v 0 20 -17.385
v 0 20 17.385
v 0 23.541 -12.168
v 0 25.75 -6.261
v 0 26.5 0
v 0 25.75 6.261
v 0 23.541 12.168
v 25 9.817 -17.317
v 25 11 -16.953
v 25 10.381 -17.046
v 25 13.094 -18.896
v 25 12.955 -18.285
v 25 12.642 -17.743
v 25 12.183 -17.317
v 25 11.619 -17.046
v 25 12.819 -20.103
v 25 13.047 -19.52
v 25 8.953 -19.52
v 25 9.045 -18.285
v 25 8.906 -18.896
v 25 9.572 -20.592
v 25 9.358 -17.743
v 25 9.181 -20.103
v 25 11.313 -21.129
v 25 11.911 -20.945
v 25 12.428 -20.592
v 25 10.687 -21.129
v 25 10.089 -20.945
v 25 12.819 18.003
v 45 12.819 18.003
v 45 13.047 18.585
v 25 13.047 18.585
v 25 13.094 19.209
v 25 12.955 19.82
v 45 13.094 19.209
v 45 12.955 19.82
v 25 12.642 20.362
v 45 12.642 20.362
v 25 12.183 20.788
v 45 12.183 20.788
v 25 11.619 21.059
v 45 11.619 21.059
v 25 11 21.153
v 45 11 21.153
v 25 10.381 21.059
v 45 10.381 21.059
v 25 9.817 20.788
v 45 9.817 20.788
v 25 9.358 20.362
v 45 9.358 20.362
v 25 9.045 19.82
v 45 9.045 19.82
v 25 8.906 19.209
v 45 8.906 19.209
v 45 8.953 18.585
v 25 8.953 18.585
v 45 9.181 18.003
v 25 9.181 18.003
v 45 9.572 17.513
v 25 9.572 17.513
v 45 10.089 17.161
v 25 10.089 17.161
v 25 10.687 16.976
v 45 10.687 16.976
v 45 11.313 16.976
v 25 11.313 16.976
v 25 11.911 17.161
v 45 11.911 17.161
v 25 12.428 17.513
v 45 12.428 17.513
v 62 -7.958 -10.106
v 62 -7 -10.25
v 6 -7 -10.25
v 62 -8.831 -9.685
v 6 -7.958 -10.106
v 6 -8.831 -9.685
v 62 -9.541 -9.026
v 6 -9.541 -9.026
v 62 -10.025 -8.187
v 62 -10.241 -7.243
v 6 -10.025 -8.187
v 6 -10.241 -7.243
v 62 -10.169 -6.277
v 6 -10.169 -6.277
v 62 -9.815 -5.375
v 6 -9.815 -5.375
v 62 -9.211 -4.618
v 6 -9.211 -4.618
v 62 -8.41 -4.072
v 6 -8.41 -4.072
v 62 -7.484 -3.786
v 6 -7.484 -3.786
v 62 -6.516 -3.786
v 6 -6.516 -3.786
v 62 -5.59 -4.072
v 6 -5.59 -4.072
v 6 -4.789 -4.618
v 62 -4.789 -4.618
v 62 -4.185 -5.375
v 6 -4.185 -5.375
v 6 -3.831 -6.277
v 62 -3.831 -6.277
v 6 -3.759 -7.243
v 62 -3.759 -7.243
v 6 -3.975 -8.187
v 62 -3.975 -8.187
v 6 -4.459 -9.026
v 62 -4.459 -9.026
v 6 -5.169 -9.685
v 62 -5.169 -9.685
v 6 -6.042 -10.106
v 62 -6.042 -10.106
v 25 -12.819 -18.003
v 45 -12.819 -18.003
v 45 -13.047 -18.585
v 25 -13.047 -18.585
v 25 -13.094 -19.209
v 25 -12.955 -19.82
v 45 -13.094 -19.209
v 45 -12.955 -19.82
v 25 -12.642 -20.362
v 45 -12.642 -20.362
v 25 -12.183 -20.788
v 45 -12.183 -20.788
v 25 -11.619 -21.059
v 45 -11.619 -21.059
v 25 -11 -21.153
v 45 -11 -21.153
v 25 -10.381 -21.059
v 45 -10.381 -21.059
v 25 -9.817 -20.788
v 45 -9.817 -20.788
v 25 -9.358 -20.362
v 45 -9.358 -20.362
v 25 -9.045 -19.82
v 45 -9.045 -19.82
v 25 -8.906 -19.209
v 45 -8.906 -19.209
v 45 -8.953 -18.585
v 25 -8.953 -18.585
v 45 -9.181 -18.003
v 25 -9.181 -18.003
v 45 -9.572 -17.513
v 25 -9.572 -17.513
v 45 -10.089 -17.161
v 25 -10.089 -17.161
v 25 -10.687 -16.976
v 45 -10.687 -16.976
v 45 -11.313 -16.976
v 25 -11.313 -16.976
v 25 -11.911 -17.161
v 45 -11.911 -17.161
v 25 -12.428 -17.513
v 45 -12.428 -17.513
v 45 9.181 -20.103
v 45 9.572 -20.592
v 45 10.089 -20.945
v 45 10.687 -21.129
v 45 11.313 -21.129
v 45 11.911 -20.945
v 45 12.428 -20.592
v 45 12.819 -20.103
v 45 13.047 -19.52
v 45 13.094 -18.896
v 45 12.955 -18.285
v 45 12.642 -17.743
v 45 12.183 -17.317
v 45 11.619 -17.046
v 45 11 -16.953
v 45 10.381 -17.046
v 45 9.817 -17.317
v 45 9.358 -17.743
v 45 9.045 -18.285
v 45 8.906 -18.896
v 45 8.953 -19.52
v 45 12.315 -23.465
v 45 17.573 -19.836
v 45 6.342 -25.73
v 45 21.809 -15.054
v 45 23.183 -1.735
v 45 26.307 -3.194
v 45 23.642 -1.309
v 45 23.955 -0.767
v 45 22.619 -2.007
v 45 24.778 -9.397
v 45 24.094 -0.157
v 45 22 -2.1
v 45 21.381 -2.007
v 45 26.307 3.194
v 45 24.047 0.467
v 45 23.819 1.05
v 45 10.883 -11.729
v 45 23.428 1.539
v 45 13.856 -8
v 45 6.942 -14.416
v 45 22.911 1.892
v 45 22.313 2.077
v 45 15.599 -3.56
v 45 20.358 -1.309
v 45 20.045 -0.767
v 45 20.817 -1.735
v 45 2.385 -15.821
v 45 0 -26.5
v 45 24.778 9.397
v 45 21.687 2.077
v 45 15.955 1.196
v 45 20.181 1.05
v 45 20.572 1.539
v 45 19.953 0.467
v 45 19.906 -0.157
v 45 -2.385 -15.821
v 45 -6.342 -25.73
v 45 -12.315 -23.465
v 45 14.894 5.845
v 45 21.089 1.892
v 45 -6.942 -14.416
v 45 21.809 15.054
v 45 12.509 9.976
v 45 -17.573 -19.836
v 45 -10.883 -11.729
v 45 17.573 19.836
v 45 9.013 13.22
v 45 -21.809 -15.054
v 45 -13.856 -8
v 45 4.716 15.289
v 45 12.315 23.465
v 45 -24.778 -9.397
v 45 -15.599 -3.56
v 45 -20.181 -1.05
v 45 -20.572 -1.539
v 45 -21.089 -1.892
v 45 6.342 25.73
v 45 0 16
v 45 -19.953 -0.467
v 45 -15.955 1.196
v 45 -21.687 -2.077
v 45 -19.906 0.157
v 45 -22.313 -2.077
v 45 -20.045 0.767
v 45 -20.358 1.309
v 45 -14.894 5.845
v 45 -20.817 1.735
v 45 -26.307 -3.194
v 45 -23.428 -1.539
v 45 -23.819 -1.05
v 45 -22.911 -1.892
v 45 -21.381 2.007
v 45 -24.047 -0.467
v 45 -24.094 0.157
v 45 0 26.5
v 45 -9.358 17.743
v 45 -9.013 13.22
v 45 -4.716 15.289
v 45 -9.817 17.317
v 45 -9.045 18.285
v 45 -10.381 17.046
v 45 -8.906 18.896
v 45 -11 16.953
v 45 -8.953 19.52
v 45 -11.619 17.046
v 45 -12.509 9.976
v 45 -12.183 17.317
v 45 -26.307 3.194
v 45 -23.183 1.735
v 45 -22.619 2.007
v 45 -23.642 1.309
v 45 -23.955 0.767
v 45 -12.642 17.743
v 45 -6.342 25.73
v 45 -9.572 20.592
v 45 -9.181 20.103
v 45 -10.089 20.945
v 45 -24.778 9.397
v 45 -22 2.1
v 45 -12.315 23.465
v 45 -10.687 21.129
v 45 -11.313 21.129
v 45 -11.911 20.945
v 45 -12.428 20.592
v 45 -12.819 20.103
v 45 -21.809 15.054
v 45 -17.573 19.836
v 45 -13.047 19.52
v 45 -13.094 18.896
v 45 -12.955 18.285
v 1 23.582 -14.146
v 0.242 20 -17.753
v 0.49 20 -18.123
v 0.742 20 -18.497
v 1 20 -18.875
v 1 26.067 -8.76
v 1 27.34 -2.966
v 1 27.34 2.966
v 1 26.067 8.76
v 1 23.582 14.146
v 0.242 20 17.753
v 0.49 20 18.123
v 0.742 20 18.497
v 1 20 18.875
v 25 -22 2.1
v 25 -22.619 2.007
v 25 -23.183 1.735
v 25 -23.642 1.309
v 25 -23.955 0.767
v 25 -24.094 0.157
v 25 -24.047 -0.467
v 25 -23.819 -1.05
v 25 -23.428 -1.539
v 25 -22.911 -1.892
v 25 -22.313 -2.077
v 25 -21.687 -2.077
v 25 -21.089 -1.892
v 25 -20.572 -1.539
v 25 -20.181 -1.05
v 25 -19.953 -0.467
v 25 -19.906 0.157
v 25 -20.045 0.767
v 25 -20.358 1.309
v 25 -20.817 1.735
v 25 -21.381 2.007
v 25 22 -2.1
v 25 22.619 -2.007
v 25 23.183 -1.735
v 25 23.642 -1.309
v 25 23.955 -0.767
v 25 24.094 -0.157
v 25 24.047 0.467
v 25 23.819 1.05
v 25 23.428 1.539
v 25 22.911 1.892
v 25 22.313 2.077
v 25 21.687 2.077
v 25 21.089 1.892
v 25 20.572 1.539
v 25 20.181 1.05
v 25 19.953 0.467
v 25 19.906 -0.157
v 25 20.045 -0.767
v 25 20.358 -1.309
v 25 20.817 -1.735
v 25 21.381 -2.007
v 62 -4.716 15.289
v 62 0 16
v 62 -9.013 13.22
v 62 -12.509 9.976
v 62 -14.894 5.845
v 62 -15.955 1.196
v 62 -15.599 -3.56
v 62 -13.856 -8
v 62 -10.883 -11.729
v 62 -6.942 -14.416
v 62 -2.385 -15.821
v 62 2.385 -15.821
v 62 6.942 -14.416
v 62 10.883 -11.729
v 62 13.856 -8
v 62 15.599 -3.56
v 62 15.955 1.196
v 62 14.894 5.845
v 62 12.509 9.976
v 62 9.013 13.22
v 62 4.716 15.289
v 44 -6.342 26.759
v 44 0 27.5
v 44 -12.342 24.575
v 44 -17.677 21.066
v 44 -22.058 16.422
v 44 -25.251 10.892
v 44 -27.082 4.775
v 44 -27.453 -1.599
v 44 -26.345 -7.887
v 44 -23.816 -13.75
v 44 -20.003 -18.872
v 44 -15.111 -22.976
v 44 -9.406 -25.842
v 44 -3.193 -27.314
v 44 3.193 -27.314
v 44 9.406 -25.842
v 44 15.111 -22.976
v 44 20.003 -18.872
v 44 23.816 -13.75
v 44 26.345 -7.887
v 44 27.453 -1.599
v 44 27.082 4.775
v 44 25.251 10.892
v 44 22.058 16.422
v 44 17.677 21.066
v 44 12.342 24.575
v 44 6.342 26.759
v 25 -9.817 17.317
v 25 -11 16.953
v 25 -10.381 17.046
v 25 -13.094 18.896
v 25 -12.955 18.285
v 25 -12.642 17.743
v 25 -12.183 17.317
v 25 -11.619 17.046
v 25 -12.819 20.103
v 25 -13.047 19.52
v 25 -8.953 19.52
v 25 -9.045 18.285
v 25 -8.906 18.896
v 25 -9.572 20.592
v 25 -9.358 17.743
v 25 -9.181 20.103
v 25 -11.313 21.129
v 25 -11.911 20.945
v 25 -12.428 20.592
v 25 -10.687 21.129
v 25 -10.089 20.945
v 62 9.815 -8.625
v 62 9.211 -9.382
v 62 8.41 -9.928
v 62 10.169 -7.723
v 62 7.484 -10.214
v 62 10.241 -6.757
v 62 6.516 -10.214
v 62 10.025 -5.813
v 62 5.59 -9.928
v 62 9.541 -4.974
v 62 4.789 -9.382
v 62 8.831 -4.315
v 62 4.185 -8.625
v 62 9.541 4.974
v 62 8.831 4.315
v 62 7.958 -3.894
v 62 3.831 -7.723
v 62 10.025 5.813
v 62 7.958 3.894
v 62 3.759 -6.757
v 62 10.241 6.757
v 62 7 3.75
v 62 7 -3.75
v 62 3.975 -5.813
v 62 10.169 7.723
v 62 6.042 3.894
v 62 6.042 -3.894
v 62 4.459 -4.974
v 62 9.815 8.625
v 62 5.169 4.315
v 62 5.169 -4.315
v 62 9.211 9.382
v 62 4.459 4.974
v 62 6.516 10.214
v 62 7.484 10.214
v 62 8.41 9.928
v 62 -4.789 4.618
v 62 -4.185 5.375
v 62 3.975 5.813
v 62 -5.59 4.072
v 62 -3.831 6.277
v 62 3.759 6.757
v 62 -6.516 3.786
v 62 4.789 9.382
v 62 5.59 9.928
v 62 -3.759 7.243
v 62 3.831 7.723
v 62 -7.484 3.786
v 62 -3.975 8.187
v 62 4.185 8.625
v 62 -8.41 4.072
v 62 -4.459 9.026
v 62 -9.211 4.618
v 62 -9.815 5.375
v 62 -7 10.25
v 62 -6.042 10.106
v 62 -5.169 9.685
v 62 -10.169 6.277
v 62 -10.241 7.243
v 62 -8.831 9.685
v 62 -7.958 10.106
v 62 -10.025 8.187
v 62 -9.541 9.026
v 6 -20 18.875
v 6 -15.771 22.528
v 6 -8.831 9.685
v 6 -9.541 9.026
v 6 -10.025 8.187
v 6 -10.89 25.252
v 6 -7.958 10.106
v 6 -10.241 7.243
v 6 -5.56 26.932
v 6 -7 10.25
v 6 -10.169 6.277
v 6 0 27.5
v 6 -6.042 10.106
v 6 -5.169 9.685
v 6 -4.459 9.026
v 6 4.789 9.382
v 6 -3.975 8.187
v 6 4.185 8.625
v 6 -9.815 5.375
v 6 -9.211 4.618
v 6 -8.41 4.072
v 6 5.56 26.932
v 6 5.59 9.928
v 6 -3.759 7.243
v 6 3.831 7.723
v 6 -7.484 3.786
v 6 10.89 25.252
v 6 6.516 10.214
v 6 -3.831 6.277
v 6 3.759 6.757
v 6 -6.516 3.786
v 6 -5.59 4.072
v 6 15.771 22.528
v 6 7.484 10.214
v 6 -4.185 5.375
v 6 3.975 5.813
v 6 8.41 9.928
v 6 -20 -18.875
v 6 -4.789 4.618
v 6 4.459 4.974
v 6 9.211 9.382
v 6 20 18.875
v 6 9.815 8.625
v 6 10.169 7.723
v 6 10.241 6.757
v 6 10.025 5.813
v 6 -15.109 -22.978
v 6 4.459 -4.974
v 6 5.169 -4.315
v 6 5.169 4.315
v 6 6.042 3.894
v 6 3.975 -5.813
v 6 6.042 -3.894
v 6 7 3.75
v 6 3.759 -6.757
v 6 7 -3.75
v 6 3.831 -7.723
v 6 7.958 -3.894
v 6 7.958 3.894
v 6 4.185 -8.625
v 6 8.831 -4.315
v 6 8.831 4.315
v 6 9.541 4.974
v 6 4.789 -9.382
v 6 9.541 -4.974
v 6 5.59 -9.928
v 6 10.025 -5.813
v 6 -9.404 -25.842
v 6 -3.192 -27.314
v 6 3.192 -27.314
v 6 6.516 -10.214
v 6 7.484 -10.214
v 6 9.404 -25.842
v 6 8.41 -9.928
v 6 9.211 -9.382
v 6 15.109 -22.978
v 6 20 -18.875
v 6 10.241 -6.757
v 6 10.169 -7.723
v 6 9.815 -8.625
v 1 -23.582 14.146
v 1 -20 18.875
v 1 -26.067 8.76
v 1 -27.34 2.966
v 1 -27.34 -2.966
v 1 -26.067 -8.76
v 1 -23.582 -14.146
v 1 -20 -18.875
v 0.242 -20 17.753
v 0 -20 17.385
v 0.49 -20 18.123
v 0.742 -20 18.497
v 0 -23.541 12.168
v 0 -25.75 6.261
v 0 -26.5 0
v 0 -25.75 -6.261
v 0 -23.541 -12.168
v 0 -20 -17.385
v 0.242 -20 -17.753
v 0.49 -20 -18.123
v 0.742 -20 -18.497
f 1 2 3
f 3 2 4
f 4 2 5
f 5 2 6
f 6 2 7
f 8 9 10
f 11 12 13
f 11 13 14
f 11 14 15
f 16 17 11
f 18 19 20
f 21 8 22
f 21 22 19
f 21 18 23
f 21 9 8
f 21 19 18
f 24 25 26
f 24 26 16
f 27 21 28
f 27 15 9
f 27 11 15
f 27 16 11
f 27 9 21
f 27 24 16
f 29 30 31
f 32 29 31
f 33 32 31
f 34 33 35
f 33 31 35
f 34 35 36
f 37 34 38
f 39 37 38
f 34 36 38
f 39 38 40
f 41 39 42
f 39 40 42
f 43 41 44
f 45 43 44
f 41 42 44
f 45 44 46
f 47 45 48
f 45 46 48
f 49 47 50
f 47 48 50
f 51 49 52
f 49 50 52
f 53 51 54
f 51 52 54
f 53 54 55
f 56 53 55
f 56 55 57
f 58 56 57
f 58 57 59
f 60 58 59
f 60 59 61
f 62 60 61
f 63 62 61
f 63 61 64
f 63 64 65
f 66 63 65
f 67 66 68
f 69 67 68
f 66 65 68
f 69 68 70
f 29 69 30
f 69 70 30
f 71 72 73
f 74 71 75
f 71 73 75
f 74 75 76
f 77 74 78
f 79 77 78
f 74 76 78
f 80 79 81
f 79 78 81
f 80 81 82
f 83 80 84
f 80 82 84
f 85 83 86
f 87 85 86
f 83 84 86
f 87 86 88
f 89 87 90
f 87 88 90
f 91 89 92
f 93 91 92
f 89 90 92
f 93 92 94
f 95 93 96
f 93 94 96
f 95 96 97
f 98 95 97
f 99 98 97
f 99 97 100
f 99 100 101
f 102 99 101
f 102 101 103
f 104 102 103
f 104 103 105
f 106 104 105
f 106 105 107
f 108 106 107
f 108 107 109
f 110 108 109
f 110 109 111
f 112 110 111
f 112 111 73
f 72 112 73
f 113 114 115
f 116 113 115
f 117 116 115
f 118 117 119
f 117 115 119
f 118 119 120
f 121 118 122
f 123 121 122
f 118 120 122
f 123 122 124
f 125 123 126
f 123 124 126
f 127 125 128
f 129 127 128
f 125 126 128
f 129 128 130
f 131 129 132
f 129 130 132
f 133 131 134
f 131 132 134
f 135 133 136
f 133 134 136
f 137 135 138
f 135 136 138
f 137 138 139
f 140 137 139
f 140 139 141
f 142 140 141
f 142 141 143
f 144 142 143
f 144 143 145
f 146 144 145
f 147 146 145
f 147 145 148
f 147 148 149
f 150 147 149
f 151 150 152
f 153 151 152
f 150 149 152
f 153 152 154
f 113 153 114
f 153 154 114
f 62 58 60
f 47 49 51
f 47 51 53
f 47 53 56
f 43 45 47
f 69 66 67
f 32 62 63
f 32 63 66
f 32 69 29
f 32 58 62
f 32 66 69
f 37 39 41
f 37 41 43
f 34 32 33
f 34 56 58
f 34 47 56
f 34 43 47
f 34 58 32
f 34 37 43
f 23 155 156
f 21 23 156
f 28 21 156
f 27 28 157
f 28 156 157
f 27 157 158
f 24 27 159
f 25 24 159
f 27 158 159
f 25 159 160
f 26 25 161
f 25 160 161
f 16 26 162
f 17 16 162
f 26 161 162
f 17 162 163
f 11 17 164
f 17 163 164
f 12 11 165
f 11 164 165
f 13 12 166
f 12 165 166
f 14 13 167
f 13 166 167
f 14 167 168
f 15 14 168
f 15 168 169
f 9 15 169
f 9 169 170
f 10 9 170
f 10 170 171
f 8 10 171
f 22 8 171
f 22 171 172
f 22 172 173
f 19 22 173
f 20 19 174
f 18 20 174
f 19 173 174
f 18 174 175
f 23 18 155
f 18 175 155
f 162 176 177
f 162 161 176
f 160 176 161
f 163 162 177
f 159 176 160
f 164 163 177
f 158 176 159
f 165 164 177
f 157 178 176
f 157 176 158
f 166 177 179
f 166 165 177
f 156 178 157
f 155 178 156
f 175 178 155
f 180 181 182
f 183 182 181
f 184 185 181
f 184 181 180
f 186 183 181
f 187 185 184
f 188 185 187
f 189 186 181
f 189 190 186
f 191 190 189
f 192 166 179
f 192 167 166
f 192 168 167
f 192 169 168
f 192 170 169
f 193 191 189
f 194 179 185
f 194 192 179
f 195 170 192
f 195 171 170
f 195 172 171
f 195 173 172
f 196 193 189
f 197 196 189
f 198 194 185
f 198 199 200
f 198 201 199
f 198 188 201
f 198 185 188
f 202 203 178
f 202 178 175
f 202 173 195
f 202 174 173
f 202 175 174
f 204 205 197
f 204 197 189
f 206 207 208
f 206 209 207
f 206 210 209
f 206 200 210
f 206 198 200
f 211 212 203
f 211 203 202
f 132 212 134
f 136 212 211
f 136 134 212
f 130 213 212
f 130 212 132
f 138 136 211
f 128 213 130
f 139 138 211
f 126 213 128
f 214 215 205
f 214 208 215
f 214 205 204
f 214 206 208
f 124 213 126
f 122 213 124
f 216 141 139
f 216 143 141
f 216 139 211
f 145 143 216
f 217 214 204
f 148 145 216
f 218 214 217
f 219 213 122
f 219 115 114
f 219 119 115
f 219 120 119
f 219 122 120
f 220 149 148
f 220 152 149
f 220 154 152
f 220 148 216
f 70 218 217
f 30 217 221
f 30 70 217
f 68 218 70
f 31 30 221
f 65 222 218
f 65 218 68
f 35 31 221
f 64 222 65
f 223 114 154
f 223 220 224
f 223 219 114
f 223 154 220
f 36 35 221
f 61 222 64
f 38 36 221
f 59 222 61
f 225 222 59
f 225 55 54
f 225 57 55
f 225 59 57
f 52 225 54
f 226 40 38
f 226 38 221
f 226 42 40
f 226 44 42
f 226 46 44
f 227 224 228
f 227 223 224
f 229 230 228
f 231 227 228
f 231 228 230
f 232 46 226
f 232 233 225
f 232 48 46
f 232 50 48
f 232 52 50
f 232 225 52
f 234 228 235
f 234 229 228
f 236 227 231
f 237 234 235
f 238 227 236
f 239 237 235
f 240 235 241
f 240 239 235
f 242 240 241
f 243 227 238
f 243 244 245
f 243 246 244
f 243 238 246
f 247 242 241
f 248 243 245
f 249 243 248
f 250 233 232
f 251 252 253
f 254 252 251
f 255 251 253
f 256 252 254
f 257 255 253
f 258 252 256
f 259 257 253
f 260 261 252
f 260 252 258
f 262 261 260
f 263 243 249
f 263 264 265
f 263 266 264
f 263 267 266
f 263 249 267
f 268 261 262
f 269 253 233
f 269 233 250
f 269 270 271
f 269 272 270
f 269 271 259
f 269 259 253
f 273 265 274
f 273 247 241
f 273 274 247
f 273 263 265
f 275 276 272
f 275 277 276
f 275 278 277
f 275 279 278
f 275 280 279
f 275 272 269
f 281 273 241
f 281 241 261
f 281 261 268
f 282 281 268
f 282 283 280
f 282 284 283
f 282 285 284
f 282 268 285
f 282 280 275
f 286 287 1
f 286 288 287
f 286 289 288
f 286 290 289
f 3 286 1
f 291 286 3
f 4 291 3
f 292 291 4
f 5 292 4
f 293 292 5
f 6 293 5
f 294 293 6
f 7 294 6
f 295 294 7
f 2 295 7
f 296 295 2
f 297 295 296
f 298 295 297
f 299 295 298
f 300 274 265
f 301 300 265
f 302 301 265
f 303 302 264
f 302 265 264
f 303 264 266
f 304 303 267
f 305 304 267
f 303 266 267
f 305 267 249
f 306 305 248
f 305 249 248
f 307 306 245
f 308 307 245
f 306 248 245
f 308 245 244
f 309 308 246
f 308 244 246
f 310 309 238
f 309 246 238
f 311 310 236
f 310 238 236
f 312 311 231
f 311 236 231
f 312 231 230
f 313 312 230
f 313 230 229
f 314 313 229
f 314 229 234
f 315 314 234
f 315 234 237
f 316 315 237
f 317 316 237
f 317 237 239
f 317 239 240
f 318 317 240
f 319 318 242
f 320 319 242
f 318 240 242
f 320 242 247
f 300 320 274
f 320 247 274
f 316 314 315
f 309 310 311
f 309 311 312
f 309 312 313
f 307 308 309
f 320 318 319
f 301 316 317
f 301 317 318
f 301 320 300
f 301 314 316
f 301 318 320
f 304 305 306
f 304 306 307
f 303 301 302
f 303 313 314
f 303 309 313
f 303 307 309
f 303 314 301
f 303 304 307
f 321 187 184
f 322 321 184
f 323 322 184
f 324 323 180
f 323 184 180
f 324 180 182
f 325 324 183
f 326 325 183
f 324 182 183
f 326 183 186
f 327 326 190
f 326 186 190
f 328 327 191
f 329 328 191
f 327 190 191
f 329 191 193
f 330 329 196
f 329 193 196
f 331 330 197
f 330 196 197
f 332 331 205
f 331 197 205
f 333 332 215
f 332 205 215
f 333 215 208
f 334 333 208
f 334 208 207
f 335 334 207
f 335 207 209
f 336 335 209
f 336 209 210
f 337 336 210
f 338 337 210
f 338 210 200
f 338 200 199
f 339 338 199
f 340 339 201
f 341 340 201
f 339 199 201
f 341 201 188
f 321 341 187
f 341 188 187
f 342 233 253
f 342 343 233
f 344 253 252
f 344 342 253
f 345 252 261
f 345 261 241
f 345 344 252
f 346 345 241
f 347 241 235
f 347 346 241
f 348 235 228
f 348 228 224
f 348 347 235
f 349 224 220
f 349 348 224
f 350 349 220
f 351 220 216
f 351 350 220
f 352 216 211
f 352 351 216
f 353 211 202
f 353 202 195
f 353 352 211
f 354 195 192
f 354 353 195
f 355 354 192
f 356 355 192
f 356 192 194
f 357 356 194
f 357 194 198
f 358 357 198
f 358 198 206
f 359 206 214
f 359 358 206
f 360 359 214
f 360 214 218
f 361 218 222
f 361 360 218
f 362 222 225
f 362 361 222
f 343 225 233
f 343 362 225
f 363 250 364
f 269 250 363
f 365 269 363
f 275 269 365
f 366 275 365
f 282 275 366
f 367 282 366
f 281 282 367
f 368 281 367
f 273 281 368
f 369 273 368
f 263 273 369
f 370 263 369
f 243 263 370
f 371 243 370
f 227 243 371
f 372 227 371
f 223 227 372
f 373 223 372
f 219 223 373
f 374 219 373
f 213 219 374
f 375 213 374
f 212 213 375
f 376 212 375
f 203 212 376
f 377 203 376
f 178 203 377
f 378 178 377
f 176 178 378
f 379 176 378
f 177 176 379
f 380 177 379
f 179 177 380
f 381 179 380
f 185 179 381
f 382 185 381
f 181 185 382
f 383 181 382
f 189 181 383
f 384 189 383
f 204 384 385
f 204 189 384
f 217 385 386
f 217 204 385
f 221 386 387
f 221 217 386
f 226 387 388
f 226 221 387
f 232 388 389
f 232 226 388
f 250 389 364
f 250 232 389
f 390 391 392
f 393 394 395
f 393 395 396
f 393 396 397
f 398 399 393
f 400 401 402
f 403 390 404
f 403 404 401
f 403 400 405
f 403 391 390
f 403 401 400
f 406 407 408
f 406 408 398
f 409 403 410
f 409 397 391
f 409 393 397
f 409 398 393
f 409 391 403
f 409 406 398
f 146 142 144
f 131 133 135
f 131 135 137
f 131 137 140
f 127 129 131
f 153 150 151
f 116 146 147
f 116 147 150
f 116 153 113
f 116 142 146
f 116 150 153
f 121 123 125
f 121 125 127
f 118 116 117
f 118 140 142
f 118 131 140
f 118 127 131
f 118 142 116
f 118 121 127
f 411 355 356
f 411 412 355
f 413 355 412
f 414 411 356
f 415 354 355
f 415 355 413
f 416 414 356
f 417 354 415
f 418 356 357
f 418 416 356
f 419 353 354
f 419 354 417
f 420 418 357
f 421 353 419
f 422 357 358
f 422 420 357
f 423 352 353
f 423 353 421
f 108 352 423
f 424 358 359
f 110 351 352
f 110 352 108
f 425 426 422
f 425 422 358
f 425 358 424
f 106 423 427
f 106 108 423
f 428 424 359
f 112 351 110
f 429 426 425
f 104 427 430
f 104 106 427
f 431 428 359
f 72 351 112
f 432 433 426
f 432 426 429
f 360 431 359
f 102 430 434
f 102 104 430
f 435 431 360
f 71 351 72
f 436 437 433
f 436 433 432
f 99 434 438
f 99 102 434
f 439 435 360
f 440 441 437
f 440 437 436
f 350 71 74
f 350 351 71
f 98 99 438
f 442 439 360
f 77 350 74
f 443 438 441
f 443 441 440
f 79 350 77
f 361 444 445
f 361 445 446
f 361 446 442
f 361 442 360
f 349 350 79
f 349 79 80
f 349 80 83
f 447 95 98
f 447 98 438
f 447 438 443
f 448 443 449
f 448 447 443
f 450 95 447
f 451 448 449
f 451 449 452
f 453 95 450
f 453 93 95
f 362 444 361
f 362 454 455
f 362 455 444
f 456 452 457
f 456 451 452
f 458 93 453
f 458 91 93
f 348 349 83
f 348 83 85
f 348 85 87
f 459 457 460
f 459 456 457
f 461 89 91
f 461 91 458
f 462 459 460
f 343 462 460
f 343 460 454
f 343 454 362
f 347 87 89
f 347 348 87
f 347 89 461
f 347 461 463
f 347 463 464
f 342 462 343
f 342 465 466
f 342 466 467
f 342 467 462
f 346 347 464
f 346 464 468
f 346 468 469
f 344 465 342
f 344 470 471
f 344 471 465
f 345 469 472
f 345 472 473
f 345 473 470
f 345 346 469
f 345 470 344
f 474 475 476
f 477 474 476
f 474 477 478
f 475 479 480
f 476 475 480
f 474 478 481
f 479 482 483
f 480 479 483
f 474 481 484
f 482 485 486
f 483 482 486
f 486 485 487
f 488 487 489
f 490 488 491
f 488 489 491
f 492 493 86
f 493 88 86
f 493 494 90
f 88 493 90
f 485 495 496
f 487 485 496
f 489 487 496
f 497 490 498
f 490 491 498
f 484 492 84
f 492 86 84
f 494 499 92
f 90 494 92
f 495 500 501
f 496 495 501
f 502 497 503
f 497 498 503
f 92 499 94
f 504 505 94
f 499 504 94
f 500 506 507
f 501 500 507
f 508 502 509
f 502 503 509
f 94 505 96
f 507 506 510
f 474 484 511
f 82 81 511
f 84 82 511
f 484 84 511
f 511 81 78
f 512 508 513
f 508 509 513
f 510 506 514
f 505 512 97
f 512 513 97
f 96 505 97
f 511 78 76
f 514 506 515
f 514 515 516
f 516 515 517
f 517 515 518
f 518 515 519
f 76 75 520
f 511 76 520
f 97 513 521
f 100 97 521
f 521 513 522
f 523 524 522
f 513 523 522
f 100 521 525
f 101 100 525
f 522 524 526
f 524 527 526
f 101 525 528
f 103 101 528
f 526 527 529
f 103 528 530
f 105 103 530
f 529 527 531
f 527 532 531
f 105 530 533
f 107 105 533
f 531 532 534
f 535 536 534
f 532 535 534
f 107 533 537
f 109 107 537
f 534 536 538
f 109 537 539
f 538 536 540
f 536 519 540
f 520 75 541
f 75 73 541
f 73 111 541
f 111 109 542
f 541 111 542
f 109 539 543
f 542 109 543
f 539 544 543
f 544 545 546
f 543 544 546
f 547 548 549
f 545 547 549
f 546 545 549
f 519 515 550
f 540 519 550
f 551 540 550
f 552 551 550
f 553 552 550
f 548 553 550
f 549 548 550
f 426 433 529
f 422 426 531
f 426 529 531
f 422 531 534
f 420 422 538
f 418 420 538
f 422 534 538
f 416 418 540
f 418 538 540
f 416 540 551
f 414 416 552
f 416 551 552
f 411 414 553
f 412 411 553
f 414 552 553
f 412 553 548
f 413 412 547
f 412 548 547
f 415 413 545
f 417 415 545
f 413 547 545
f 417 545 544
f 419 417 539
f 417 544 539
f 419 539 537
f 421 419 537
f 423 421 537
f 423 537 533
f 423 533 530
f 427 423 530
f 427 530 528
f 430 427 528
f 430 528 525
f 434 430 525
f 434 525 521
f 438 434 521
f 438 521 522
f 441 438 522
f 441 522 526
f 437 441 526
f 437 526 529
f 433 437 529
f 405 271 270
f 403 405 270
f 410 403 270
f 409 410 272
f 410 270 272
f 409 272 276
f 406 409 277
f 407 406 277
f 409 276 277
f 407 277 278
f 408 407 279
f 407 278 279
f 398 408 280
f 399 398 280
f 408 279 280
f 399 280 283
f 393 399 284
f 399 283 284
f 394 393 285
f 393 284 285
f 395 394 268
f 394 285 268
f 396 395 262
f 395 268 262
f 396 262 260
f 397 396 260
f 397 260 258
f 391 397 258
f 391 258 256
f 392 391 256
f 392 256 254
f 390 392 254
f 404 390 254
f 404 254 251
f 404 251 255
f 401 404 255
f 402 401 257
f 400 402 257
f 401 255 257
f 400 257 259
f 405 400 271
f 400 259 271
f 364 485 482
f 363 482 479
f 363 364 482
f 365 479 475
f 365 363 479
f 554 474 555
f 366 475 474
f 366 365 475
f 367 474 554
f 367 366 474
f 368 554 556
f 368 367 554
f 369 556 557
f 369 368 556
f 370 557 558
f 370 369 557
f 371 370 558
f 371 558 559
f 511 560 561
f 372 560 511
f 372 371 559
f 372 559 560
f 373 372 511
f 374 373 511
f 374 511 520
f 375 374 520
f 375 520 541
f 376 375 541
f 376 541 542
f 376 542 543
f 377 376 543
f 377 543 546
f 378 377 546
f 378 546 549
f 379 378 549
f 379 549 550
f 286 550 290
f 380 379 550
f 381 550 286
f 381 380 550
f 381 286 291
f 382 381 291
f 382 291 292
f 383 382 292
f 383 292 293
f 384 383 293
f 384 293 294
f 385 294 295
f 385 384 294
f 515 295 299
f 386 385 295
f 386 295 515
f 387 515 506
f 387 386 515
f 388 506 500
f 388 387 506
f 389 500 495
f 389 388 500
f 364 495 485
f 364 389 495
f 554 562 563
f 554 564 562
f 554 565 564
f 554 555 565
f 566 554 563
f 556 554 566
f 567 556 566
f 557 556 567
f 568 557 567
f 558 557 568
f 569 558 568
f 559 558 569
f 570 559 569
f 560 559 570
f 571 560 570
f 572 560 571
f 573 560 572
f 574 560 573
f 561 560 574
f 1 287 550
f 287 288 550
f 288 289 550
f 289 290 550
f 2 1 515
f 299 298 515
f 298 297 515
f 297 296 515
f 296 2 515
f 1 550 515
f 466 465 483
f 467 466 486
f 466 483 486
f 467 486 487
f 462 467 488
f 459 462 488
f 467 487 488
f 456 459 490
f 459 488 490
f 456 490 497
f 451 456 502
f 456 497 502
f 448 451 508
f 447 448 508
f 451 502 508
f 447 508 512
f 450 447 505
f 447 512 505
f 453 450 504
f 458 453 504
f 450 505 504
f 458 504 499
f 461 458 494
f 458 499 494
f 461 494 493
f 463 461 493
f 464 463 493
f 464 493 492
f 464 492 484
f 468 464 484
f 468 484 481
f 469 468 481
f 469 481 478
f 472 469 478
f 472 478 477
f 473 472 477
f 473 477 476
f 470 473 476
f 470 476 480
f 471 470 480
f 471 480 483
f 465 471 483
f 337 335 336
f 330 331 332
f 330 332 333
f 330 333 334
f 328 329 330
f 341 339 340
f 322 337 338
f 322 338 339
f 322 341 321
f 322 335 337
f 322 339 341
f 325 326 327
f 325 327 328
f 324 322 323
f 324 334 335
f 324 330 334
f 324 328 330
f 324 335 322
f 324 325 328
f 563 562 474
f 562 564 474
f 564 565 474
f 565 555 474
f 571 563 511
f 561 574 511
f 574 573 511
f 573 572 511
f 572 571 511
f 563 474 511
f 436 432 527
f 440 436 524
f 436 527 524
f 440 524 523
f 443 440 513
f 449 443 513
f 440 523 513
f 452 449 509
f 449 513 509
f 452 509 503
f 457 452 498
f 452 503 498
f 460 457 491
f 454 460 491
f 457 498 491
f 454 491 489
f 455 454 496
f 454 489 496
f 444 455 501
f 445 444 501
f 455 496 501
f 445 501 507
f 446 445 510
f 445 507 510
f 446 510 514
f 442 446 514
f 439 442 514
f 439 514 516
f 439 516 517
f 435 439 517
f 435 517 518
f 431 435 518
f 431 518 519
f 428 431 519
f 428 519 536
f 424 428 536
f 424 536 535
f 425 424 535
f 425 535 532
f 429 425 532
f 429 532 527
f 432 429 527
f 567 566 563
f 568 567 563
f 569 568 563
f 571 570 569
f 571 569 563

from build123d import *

# Parameters (mm, degrees)
SKETCH2_R          = 3.25
CUT_EXTRUDE1_DEPTH = 74.188113789
SKETCH3_R          = 2.1
CUT_EXTRUDE2_DEPTH = 20
CIRPATTERN1_COUNT  = 6
CHAMFER1_SIZE      = 1
CUT_EXTRUDE3_START = -6
CUT_EXTRUDE3_DEPTH = 6


with BuildPart() as part:
    # Sketch1 → Revolve1 (revolve)
    with BuildSketch(Plane.XY):
        Polygon((0, 0), (0, 27.5), (45, 27.5), (45, 16), (62, 16), (62, 0), align=None)
    revolve(axis=Axis((0, 0, 0), (1, 0, 0)))

    # Sketch2 → Cut-Extrude1 (cut, through all)
    with BuildSketch(Plane.ZY):
        with Locations((-7, 7)):
            Circle(SKETCH2_R)
        with Locations((7, 7)):
            Circle(SKETCH2_R)
        with Locations((7, -7)):
            Circle(SKETCH2_R)
        with Locations((-7, -7)):
            Circle(SKETCH2_R)
    extrude(amount=-CUT_EXTRUDE1_DEPTH, mode=Mode.SUBTRACT)

    # Sketch3 → Cut-Extrude2 (cut)
    with BuildSketch(Plane(origin=(45, 0, 0), x_dir=(0, 0, -1), z_dir=(1, 0, 0))):
        with Locations((0, 22)):
            Circle(SKETCH3_R)
    cut_extrude2 = extrude(amount=-CUT_EXTRUDE2_DEPTH, mode=Mode.SUBTRACT)

    # CirPattern1: Cut-Extrude2 ×6 about axis
    cirpattern1_axis = Axis((45, 0, 0), (-1, 0, 0))
    for i in range(1, CIRPATTERN1_COUNT):
        add(cut_extrude2.rotate(cirpattern1_axis, i * 360 / CIRPATTERN1_COUNT), mode=Mode.SUBTRACT)

    # Chamfer1
    chamfer1_edges = [part.edges().sort_by_distance(p)[0] for p in [
        (0, -27.5, 0),
        (45, -27.5, 0),
        (0, 7, -10.25),
        (0, 7, 3.75),
        (0, -7, 3.75),
        (0, -7, -10.25),
    ]]
    chamfer(chamfer1_edges, length=CHAMFER1_SIZE)

    # Sketch4 → Cut-Extrude3 (cut)
    with BuildSketch(Plane.ZY.offset(CUT_EXTRUDE3_START)):
        with BuildLine():
            Line((-18.874586088, 20), (18.874586088, 20))
            ThreePointArc((18.874586088, 20), (27.5, 0), (18.874586088, -20))
            Line((18.874586088, -20), (-18.874586088, -20))
            ThreePointArc((-18.874586088, -20), (-27.5, 0), (-18.874586088, 20))
        make_face()
    extrude(amount=CUT_EXTRUDE3_DEPTH, mode=Mode.SUBTRACT)


solid = part.part
